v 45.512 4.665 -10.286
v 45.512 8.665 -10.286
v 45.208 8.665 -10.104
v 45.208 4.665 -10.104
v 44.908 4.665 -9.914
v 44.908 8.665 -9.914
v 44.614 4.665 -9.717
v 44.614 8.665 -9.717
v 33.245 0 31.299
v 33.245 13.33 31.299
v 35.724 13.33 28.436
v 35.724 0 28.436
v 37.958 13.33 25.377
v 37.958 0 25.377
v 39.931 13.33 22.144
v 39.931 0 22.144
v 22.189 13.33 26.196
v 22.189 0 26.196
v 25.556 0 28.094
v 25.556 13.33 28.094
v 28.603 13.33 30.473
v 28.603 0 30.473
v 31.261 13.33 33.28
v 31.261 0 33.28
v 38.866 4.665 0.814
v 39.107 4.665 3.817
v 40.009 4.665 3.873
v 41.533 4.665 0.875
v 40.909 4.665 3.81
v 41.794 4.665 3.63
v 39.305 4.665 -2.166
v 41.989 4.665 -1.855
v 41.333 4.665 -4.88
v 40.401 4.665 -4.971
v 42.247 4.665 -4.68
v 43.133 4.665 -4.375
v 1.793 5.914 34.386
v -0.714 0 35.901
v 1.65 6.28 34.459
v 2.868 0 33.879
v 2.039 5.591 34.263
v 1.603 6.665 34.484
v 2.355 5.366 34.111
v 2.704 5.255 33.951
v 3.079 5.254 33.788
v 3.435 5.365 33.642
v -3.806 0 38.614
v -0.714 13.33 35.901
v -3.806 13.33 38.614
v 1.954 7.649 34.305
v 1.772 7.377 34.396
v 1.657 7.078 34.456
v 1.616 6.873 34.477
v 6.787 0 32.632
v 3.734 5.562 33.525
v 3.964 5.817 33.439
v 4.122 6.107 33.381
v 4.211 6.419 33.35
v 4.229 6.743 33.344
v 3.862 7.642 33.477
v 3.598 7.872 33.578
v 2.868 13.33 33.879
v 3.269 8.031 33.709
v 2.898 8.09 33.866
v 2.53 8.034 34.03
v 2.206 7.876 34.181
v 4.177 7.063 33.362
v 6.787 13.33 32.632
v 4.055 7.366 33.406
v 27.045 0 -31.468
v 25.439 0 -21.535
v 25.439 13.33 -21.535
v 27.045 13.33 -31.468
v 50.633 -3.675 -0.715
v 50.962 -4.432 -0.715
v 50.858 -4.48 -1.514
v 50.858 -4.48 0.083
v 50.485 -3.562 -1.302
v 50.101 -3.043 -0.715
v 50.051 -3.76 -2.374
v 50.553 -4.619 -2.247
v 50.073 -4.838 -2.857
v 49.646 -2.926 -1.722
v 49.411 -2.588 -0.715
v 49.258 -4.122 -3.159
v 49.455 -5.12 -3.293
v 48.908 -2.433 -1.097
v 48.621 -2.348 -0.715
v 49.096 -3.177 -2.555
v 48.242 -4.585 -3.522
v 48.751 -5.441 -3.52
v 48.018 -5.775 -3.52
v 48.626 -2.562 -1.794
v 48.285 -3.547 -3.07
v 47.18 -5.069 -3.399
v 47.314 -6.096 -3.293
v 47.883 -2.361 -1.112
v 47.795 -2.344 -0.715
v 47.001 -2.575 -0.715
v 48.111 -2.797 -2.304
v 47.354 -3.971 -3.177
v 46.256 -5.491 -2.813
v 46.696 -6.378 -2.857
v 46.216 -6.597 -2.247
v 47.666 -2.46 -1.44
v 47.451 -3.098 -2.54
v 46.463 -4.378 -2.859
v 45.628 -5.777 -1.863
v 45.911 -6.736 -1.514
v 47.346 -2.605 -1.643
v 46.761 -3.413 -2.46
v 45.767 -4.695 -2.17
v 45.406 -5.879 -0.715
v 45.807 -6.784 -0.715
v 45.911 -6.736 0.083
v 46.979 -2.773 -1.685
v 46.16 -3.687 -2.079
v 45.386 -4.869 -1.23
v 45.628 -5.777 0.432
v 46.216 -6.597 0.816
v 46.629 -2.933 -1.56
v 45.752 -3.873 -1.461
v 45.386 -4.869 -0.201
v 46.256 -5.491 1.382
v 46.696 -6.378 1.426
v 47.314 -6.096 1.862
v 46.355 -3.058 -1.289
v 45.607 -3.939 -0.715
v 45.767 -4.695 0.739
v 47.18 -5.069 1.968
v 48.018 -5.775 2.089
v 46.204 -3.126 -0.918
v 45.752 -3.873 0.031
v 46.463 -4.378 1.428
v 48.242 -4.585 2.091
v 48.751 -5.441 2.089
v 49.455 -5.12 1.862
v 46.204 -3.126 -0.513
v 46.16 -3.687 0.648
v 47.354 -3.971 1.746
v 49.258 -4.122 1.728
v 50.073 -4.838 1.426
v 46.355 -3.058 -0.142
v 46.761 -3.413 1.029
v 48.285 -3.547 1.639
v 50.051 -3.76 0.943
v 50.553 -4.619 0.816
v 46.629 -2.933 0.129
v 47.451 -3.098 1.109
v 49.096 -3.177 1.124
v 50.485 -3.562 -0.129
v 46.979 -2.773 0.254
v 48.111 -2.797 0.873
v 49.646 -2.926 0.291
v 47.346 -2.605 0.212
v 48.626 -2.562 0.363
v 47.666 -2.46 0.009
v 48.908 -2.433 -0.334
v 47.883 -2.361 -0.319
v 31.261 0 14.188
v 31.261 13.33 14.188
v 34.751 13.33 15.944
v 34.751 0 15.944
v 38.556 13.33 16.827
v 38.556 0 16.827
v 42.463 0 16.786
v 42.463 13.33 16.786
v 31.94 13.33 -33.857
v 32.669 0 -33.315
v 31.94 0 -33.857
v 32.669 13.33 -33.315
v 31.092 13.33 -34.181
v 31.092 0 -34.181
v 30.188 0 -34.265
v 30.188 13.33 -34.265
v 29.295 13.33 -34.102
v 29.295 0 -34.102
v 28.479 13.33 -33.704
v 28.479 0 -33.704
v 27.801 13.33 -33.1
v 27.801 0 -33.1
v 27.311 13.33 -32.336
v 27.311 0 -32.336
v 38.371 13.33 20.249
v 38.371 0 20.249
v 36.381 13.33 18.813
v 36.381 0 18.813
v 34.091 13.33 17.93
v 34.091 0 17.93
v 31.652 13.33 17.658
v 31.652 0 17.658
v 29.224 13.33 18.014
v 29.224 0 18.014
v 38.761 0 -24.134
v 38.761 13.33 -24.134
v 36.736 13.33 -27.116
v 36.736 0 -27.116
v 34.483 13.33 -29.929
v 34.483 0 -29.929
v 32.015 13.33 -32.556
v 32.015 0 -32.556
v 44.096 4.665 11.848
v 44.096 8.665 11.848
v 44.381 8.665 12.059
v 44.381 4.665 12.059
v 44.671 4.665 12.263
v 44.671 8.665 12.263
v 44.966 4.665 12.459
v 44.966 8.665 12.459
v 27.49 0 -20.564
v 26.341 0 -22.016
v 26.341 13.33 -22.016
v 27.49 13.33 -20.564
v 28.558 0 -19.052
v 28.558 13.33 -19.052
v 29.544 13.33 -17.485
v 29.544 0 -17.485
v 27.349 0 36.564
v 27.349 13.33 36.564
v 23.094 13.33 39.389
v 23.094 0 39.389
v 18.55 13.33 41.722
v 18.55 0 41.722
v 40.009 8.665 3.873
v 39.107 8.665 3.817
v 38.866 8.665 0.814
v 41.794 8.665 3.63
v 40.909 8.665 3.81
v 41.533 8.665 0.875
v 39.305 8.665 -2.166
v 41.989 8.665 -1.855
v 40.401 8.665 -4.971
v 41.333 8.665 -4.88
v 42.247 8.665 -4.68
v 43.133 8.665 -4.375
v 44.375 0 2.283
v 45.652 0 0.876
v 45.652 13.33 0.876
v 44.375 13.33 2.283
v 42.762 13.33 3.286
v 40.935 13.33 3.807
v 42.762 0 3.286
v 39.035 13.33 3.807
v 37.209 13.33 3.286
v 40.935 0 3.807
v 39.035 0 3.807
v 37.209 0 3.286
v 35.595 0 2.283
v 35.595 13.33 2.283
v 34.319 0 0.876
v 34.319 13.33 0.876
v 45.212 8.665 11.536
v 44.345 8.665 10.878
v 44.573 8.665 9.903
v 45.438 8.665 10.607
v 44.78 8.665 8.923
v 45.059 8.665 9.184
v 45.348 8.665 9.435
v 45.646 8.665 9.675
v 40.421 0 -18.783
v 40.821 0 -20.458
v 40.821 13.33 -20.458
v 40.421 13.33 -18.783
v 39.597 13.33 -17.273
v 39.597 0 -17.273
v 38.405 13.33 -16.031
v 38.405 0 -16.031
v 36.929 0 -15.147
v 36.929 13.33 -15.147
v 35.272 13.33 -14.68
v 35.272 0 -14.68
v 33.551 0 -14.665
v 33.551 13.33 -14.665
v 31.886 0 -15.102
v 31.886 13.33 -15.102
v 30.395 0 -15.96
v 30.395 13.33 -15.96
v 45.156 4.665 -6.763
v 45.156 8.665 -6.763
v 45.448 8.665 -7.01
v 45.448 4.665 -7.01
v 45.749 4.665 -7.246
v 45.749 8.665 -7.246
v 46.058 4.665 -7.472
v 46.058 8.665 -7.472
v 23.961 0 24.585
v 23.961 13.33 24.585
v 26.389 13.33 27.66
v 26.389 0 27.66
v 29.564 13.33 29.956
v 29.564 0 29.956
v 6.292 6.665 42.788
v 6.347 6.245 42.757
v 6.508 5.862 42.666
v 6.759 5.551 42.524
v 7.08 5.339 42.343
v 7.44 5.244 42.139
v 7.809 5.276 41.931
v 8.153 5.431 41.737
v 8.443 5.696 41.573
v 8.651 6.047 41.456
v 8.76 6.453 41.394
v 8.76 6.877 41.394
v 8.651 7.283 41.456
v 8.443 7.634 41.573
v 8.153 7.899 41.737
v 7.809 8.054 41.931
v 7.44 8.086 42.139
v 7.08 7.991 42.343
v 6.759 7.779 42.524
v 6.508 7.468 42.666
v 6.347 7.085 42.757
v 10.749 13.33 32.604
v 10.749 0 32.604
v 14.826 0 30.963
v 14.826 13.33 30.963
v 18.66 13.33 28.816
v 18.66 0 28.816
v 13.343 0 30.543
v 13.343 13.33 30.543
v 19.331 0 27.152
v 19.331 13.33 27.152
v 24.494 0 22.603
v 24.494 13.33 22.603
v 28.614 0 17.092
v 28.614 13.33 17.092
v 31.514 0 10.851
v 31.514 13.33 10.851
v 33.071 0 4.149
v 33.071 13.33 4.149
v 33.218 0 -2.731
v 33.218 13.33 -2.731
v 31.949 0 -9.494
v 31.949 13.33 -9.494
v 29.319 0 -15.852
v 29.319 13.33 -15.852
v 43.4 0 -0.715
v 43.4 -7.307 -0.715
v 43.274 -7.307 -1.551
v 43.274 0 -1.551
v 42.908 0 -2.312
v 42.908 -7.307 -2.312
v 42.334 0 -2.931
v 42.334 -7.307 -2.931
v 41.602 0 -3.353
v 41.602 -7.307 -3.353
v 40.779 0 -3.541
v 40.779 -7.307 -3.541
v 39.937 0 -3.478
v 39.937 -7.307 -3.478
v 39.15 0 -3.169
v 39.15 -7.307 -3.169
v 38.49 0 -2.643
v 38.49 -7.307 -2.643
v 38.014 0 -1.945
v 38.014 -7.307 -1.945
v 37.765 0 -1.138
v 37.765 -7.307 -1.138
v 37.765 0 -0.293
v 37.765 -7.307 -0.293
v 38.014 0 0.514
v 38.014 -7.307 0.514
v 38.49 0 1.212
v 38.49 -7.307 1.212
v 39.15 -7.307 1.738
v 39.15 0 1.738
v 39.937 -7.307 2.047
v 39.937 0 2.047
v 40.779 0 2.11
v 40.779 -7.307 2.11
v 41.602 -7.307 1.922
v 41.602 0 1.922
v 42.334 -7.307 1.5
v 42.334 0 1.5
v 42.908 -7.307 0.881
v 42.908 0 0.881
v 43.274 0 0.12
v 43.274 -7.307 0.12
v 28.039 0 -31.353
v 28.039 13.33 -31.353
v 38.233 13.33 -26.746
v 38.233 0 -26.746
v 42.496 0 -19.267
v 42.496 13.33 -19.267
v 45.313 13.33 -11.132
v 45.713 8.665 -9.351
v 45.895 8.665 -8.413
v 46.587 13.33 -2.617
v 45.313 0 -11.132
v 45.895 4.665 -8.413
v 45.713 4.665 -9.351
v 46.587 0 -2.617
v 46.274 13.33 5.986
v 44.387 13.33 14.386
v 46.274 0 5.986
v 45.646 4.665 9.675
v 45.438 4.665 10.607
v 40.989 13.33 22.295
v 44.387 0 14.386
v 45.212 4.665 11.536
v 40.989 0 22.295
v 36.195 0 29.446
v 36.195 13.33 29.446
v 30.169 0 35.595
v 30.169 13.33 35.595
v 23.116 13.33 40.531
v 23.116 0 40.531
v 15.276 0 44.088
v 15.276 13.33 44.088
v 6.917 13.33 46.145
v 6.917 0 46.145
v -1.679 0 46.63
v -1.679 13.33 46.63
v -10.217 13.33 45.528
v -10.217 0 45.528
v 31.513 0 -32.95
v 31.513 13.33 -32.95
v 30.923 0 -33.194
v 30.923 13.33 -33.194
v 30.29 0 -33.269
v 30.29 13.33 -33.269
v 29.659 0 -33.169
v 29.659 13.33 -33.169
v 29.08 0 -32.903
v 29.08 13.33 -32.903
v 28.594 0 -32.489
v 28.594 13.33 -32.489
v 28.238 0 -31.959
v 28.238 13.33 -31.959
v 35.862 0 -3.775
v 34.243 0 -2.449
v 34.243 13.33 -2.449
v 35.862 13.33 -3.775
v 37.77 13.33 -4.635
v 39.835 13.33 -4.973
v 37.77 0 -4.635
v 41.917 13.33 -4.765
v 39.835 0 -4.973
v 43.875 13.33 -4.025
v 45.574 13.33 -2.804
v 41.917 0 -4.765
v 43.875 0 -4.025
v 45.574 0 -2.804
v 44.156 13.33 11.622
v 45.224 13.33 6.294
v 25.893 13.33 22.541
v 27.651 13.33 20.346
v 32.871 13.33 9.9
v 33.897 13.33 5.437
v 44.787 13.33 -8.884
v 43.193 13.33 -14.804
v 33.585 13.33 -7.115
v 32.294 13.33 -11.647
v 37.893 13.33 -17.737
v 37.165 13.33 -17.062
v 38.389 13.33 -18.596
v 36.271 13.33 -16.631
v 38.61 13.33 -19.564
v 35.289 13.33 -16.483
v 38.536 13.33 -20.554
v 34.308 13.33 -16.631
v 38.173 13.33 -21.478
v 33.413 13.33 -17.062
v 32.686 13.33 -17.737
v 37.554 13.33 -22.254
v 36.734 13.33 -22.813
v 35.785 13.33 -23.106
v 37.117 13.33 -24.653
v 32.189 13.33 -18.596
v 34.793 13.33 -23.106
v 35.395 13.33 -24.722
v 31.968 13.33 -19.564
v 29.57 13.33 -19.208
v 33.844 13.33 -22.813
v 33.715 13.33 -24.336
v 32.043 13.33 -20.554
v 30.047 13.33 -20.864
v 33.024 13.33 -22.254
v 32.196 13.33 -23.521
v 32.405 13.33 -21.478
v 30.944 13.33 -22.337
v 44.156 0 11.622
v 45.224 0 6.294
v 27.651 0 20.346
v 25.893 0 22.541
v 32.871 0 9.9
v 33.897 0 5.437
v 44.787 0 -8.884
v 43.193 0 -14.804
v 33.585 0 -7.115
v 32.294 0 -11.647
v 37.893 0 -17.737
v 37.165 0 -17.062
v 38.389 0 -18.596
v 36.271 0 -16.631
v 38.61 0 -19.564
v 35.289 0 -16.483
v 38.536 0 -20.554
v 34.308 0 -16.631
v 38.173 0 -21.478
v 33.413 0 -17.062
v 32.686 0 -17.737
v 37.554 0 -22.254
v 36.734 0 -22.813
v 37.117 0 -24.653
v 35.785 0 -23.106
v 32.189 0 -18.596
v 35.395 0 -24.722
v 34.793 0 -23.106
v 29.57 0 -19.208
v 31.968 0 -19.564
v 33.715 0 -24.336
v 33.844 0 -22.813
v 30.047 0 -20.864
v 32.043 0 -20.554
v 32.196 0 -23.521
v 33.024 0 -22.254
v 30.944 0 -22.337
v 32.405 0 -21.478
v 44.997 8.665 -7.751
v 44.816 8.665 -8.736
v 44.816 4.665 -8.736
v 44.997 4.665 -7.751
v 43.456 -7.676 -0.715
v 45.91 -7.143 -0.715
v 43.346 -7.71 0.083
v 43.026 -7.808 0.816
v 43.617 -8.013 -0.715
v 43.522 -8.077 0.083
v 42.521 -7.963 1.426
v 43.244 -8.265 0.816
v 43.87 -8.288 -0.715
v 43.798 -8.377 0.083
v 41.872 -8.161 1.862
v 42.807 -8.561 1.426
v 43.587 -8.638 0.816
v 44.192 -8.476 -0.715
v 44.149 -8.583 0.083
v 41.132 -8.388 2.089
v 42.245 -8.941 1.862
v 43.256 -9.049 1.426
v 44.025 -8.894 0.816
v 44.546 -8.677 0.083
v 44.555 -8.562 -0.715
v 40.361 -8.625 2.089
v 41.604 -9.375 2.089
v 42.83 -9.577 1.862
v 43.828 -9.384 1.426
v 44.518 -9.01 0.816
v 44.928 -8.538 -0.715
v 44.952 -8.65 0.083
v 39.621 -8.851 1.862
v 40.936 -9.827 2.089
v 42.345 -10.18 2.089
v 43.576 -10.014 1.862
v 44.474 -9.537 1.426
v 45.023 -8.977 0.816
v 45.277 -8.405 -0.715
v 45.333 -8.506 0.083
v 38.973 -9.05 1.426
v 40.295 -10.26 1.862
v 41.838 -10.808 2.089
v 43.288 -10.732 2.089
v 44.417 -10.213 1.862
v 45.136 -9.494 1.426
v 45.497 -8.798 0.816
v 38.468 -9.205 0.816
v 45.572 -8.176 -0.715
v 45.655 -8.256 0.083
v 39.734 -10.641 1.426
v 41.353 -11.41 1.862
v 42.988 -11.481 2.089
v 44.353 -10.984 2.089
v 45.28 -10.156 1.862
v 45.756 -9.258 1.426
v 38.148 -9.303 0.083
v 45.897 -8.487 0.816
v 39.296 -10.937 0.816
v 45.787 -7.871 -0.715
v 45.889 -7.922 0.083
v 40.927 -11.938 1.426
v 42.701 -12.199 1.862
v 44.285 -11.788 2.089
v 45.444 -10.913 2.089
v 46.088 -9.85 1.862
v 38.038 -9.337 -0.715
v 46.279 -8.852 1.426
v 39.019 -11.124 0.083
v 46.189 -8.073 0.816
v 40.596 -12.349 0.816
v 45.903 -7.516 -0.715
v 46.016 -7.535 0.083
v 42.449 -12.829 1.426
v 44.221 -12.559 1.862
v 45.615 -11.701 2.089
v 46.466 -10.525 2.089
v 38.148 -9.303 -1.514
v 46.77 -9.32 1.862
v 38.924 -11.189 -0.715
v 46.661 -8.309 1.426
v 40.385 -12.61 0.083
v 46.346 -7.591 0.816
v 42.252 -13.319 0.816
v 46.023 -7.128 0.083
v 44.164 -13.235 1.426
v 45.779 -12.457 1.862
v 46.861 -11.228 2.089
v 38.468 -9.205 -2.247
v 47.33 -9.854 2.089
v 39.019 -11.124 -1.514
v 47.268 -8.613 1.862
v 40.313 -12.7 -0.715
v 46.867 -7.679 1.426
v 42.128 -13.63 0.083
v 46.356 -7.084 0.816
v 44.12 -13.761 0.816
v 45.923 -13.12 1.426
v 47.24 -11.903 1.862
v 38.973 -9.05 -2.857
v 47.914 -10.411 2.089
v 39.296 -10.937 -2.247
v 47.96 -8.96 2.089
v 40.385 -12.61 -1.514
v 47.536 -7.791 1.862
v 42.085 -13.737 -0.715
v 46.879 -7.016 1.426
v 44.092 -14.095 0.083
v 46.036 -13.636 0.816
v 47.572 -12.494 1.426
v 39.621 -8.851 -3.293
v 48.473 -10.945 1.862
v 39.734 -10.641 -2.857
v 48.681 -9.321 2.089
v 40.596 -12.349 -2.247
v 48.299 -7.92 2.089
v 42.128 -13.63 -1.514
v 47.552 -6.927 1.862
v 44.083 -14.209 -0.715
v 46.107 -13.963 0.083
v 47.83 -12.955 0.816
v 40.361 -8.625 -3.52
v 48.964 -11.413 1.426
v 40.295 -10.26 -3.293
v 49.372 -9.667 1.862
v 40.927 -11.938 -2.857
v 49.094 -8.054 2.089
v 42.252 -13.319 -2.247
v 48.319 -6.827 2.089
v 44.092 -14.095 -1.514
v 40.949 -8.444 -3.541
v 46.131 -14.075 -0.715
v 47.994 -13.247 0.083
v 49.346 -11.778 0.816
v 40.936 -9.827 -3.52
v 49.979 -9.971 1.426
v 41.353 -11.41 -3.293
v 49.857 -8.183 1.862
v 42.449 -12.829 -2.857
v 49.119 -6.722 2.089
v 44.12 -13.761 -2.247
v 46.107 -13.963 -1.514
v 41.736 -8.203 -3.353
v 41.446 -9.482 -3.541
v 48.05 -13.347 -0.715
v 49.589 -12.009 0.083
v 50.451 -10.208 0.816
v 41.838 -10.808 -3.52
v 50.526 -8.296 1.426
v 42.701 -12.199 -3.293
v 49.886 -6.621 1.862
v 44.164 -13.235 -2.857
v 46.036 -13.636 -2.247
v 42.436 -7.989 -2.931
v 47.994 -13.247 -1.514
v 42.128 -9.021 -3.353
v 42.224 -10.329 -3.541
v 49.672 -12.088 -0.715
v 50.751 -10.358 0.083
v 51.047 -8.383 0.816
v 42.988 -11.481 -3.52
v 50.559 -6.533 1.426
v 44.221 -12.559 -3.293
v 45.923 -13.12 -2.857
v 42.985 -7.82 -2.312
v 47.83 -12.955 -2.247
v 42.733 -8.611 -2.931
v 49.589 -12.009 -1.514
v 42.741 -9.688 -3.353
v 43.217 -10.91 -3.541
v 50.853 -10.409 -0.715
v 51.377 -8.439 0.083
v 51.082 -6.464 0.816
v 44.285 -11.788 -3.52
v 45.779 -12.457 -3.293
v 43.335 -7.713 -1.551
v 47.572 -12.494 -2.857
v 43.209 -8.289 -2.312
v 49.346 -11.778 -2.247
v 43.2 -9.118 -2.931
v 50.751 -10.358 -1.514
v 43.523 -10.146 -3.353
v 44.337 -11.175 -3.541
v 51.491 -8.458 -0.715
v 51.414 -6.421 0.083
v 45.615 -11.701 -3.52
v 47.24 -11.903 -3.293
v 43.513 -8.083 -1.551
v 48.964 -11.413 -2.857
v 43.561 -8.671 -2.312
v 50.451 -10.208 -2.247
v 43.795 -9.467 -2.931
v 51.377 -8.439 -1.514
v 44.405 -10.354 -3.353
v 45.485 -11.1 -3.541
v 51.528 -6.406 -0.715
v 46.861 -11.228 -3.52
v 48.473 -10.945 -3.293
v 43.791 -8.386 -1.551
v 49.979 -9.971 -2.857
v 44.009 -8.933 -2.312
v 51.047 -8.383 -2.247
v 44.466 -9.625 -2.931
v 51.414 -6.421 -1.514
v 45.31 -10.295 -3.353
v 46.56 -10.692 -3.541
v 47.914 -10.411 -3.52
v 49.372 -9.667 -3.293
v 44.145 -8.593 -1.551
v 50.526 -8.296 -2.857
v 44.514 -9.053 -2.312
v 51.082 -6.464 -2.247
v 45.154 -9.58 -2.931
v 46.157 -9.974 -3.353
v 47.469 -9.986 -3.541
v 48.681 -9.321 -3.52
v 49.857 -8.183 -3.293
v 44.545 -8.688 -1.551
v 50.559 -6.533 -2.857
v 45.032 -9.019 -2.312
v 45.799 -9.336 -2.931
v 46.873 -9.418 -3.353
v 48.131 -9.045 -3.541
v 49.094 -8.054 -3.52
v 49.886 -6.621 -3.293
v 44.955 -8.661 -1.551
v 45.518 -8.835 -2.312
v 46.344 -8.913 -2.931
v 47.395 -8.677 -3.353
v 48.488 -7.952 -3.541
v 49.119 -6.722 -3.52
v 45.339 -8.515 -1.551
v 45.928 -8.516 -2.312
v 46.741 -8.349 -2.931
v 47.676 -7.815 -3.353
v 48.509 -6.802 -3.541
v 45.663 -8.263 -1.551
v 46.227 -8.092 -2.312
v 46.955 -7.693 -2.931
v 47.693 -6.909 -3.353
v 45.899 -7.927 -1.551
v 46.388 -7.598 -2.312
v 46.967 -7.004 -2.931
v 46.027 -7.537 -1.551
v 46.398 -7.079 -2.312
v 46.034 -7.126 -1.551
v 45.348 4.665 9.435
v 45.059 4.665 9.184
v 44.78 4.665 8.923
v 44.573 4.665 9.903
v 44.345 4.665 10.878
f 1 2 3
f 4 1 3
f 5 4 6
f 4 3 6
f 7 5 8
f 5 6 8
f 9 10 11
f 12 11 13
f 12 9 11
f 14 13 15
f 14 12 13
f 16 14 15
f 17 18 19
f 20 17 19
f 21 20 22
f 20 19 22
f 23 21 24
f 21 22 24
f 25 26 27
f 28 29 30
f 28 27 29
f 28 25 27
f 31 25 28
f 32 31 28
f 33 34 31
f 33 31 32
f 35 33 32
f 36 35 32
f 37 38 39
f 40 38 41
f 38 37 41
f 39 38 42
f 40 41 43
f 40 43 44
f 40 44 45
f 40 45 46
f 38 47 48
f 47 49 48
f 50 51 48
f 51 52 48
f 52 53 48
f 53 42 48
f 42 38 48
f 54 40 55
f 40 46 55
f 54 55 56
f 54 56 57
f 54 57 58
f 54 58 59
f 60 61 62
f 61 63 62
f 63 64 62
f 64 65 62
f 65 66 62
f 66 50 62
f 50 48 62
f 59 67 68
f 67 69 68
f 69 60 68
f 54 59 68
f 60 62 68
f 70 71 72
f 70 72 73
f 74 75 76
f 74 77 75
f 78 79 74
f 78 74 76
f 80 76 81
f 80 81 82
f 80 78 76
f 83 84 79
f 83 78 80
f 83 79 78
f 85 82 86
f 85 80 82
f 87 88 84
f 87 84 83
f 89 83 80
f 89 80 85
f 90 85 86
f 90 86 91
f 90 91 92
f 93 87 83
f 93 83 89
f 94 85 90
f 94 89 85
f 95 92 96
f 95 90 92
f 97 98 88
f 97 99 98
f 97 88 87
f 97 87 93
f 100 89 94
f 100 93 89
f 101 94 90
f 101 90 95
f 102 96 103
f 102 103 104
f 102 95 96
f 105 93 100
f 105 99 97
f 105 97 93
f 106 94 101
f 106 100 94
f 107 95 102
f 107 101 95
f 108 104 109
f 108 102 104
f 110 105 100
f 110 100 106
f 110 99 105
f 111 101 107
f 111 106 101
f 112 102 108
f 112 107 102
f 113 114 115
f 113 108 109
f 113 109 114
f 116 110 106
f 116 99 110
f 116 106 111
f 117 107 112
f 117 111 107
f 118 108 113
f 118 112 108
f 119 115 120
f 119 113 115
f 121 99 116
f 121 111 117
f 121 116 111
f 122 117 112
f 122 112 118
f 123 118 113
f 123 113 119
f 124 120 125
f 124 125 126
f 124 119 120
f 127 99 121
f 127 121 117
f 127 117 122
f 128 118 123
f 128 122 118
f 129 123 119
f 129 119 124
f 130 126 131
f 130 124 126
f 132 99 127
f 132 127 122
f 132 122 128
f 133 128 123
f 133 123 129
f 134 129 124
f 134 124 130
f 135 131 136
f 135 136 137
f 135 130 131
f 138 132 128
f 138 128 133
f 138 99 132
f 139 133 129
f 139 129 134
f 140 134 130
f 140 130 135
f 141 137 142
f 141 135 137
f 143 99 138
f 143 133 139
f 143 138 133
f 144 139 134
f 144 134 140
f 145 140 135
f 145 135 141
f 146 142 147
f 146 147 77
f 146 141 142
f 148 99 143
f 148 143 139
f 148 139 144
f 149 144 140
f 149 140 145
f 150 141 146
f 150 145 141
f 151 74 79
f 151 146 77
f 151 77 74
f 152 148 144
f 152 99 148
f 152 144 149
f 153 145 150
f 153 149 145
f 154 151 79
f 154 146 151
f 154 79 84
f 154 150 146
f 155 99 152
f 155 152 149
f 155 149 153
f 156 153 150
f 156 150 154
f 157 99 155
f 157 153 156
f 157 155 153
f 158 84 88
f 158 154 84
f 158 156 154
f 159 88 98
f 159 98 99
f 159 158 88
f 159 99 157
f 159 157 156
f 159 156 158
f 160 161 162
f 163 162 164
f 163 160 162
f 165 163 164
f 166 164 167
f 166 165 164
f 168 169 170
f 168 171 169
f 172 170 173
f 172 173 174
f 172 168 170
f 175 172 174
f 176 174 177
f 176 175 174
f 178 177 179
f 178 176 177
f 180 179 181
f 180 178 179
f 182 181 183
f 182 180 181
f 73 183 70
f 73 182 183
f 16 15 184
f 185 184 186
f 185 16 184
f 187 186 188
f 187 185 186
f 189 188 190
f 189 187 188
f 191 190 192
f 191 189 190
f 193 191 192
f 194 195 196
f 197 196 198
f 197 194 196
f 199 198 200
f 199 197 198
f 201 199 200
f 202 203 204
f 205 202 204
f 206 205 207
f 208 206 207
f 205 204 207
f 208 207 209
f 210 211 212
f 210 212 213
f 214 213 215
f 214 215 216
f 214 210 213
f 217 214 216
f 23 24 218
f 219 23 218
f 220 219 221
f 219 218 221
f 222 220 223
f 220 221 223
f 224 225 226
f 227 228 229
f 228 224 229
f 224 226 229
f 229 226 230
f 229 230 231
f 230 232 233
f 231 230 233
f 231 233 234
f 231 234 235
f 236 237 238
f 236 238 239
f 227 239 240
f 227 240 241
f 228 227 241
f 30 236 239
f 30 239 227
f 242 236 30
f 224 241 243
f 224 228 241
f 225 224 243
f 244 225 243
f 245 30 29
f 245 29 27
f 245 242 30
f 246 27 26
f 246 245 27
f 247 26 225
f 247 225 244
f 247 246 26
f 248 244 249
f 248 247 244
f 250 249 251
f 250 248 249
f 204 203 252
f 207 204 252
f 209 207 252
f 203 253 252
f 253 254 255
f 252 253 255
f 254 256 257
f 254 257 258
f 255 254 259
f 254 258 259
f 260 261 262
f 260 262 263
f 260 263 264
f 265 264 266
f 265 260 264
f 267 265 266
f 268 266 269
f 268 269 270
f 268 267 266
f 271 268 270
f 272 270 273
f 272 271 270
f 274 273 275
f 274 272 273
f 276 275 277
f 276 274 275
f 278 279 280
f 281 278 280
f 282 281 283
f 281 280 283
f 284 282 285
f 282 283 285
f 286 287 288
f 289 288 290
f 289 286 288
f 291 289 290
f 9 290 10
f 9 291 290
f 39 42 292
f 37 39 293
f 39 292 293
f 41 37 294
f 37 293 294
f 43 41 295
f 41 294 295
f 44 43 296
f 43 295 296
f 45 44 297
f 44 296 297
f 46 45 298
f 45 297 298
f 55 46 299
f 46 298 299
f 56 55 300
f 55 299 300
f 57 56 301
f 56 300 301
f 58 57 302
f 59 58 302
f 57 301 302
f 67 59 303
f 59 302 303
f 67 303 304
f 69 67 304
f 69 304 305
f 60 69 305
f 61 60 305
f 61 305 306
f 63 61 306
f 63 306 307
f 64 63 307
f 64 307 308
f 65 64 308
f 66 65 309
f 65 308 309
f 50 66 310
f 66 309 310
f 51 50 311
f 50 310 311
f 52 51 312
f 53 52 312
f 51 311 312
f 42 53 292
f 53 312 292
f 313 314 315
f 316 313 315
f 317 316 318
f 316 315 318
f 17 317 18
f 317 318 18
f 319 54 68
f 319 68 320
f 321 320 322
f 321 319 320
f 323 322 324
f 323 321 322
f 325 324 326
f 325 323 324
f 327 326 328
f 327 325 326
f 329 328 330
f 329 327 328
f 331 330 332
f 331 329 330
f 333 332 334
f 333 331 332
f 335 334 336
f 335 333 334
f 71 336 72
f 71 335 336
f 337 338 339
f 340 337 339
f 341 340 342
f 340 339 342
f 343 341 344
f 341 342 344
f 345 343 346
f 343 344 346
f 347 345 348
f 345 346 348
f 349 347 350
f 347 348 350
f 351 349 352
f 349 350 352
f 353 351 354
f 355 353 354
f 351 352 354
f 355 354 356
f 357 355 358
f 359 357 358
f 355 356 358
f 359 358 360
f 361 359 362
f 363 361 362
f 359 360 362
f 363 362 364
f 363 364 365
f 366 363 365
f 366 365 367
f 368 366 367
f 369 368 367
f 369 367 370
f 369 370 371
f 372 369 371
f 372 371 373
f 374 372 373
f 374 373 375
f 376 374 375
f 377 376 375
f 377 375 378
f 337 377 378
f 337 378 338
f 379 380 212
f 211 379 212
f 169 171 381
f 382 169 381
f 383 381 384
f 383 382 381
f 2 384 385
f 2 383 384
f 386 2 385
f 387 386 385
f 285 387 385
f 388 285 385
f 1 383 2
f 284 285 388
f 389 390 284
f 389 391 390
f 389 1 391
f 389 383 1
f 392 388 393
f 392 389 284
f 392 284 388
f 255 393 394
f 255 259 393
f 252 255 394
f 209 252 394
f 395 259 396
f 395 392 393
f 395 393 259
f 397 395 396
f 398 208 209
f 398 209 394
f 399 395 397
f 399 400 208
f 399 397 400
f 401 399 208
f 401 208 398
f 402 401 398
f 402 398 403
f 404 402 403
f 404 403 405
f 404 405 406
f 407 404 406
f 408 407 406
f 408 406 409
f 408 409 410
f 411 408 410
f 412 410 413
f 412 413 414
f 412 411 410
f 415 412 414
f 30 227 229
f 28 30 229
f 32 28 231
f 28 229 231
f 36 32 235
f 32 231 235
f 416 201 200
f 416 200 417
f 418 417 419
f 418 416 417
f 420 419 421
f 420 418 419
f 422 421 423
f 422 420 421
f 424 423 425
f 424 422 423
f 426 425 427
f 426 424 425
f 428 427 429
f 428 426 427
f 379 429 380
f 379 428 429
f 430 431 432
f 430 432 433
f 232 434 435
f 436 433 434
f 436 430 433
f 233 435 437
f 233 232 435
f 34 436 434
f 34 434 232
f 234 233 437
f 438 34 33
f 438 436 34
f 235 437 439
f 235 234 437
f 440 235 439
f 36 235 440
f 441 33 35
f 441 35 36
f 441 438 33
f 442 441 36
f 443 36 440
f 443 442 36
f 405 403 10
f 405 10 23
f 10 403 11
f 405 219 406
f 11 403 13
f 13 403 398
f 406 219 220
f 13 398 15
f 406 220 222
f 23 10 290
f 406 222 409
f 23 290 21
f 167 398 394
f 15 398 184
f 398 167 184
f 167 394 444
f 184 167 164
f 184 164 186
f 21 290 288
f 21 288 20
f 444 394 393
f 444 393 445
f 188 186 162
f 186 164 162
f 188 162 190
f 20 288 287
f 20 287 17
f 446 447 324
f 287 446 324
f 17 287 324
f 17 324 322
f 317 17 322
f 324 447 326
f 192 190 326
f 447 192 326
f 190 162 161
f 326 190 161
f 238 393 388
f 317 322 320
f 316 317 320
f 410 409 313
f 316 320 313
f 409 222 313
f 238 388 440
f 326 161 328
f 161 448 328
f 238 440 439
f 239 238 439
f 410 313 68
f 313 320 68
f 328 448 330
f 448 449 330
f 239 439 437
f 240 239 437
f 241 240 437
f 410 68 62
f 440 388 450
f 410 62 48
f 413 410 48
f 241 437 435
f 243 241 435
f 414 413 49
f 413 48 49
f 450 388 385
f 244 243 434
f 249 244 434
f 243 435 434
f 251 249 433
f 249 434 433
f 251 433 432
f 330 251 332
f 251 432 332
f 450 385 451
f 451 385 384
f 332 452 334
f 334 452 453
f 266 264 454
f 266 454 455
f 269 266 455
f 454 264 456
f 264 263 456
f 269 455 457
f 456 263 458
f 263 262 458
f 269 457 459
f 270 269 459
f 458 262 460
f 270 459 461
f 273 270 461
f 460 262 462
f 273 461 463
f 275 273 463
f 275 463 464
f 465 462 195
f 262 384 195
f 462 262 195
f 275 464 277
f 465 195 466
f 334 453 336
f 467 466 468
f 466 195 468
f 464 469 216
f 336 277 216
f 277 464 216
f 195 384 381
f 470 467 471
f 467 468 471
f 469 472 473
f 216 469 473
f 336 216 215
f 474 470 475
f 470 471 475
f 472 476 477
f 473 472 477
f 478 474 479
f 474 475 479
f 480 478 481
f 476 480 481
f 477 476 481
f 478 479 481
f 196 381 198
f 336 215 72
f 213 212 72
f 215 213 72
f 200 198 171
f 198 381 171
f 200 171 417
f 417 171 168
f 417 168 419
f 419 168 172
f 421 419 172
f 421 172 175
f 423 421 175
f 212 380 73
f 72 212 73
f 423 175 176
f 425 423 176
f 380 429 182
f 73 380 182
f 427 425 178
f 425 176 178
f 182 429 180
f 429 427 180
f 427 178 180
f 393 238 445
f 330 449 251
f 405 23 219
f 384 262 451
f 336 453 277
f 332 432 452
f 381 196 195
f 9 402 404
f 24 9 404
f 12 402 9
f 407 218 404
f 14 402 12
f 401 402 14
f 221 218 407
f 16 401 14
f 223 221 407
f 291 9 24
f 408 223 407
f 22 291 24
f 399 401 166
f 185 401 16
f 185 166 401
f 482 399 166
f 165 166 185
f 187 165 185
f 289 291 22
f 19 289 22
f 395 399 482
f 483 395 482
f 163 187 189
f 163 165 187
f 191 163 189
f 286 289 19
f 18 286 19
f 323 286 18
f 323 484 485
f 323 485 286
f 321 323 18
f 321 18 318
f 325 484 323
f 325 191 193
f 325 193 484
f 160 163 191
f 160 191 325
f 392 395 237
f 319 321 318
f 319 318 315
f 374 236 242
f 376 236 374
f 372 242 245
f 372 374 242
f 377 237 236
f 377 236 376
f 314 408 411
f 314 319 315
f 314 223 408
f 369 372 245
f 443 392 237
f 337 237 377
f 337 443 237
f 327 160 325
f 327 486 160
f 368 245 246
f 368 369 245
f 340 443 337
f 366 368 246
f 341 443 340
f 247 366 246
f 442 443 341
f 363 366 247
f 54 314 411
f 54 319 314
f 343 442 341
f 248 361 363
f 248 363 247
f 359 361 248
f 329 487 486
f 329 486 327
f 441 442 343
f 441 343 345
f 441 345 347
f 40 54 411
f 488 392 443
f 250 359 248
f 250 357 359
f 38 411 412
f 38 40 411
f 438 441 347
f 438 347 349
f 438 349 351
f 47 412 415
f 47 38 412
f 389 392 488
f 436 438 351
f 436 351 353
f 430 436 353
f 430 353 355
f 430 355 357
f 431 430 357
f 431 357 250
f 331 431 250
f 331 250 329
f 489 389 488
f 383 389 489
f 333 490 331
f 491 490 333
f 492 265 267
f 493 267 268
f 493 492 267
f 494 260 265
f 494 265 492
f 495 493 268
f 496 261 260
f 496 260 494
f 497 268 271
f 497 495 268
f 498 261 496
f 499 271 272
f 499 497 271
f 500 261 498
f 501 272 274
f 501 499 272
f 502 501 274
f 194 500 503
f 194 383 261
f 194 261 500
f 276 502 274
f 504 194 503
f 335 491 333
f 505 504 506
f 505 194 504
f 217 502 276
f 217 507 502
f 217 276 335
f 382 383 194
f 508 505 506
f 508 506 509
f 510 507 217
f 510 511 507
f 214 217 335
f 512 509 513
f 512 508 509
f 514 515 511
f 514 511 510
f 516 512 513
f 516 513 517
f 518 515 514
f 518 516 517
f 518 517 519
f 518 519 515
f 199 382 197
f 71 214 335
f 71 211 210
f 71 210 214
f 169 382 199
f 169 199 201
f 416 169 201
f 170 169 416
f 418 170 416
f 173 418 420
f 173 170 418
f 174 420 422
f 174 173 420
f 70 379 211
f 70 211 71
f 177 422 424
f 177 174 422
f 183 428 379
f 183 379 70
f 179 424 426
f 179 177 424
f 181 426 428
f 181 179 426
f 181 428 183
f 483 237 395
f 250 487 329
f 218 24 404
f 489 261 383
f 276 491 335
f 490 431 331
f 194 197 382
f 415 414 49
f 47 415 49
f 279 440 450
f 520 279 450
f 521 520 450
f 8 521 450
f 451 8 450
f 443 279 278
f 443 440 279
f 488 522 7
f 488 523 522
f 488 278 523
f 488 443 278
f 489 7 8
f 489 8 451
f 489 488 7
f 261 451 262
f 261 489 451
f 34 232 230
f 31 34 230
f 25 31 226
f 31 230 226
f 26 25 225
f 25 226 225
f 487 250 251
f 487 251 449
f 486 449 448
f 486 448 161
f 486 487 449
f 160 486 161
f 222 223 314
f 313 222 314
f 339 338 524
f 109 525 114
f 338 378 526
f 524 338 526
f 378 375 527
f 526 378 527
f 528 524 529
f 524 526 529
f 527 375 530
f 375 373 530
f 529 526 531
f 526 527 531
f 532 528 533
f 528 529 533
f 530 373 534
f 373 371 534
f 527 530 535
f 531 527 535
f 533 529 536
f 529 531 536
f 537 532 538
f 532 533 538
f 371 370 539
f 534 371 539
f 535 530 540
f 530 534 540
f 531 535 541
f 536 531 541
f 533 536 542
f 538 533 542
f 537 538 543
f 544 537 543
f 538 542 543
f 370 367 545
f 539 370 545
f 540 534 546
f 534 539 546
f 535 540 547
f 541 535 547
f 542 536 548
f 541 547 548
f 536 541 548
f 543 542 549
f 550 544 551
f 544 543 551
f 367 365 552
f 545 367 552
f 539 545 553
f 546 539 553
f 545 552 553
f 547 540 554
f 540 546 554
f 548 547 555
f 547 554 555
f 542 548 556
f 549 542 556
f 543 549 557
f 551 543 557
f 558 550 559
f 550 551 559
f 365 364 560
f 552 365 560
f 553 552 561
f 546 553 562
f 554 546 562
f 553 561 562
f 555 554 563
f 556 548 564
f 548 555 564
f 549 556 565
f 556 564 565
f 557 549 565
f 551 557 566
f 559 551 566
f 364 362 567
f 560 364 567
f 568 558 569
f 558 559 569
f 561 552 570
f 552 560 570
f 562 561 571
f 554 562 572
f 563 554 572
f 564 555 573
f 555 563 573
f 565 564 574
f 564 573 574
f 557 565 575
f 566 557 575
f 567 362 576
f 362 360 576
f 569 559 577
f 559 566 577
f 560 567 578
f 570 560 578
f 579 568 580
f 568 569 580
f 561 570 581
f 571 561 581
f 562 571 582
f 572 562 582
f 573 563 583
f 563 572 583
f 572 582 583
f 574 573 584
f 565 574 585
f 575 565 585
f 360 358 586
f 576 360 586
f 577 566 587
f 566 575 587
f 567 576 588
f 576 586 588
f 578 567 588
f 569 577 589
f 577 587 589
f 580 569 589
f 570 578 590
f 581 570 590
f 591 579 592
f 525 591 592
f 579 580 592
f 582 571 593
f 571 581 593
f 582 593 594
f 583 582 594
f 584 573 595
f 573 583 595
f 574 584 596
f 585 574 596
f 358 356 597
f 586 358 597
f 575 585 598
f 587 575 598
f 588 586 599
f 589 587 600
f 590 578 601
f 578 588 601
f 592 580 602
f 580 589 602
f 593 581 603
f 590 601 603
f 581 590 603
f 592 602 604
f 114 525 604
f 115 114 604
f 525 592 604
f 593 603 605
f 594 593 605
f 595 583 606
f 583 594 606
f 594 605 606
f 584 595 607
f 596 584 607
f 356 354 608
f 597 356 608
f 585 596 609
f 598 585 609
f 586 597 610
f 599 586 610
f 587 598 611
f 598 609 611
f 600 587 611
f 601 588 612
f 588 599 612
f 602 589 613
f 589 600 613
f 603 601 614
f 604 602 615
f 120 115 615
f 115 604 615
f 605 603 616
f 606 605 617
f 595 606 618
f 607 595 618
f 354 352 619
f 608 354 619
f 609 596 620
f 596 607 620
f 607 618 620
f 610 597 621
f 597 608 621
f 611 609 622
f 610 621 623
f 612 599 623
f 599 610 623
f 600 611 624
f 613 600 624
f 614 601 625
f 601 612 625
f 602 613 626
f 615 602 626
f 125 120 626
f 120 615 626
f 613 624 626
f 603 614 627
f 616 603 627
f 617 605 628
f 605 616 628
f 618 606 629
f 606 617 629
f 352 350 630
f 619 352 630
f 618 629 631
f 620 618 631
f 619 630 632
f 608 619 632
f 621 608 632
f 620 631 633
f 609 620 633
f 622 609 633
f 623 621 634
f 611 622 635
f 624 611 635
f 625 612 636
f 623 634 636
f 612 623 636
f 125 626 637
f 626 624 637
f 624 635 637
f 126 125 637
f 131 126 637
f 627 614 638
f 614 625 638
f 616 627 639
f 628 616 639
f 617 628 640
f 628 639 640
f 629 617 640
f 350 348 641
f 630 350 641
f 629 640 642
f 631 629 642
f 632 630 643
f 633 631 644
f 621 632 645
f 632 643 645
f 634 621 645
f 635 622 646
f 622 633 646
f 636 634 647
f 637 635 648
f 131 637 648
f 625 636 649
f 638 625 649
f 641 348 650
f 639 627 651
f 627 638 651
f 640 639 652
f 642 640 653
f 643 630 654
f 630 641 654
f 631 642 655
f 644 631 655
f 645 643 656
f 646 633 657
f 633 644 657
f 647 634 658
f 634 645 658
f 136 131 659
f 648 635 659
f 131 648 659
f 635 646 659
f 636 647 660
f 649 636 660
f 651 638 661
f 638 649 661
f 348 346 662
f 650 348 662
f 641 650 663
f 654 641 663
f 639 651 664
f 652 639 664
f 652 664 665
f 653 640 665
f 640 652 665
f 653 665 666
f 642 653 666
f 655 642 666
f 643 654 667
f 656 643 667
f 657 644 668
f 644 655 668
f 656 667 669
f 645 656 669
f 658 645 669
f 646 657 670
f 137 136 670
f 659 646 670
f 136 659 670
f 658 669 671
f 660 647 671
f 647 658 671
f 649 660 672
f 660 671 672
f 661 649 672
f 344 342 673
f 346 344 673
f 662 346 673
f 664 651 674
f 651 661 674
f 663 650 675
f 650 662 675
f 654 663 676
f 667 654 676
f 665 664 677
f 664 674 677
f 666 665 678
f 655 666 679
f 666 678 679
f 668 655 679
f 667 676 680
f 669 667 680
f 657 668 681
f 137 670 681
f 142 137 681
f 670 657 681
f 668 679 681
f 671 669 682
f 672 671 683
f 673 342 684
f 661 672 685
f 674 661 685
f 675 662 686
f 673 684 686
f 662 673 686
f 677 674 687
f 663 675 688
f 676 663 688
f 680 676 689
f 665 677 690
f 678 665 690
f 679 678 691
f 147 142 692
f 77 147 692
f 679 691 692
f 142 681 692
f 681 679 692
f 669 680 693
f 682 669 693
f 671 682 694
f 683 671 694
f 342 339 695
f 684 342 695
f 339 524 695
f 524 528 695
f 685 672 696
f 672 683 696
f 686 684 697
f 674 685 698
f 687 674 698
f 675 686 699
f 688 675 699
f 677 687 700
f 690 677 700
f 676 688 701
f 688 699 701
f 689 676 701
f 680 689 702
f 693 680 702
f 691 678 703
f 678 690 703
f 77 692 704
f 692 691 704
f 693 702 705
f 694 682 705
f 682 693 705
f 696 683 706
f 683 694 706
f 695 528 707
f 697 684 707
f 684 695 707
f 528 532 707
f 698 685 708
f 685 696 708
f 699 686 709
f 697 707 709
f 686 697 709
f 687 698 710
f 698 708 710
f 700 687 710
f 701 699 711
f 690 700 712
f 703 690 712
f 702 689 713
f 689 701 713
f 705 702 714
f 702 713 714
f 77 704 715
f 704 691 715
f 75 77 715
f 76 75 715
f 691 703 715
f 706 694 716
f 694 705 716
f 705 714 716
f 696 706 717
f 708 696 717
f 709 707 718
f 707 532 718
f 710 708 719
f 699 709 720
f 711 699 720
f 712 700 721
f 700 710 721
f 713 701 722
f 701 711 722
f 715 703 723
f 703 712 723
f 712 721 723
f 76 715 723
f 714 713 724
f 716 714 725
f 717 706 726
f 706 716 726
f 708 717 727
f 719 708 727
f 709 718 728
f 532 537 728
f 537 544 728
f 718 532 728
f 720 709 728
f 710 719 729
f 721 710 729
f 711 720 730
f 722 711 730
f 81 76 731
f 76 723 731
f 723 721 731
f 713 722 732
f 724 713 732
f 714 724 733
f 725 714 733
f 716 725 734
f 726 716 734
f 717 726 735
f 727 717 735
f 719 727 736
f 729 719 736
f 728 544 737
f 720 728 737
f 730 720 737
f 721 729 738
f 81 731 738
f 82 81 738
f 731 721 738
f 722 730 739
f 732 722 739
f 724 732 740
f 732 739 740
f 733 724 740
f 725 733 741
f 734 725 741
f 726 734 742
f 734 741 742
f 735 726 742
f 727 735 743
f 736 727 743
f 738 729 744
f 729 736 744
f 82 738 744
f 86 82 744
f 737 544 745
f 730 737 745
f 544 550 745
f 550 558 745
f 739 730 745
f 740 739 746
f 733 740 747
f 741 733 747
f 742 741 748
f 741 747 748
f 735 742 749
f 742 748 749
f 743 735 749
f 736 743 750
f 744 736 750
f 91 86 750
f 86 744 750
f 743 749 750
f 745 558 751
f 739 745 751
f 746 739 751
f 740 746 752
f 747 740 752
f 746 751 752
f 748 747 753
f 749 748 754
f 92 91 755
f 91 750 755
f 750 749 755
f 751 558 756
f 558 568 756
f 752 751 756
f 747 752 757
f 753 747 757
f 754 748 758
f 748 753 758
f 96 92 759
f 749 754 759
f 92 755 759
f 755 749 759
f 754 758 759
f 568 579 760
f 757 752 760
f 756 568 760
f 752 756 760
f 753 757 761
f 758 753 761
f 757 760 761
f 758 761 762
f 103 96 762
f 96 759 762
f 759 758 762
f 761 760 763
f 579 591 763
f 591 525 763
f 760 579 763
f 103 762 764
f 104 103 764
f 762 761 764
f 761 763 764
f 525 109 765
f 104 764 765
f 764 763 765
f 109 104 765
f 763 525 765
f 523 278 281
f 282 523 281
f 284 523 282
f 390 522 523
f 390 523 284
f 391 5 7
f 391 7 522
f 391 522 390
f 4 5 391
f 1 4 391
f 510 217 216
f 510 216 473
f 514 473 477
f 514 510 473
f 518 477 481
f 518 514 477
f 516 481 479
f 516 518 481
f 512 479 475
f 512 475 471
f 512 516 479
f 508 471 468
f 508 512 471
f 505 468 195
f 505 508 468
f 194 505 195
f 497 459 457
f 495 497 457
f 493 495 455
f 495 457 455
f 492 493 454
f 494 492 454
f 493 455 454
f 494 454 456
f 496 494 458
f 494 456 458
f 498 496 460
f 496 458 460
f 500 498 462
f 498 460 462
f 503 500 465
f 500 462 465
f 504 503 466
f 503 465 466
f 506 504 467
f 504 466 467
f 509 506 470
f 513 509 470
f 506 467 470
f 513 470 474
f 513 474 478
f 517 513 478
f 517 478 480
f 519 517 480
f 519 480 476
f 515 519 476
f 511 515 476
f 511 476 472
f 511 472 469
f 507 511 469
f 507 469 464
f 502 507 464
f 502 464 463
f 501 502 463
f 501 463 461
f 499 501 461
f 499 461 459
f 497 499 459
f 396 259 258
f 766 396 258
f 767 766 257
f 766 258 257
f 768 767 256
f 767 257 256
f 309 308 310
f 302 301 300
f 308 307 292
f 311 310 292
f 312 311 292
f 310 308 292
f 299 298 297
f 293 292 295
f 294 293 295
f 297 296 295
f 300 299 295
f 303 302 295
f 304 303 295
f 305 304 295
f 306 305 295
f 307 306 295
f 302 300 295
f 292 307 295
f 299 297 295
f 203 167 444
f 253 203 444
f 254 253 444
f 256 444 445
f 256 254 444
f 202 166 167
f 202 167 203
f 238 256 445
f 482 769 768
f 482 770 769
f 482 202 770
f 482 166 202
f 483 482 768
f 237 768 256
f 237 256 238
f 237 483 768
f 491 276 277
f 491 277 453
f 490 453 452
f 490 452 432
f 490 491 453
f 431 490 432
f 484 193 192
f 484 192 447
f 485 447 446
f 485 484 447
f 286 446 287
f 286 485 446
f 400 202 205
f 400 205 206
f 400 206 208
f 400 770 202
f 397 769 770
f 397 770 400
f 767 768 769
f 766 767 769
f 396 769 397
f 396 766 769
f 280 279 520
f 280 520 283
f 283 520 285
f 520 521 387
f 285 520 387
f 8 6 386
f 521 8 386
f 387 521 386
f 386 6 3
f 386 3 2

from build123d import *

# Parameters (mm, degrees)
BOSS_EXTRUDE1_DEPTH        = 13.33
FILLET1_R                  = 20
SKETCH3_R                  = 3.33
CUT_EXTRUDE2_DEPTH         = 68.320131462
FILLET2_R                  = 3.333
SKETCH4_R                  = 2.8333333
DOME1_FACE_RADIUS          = 2.8333333
DOME1_HEIGHT               = 3.3333333
CUT_EXTRUDE3_DEPTH         = 2
MIRROR3_COPY_1_FACE_RADIUS = 2.8333333
MIRROR3_COPY_1_HEIGHT      = 3.3333333
SKETCH16_W                 = 36.728720905
SKETCH16_H                 = 19.011400322
CUT_EXTRUDE4_DEPTH         = 30
CUT_EXTRUDE5_DEPTH         = 71.999747127
SKETCH19_R                 = 1.425
CUT_EXTRUDE6_DEPTH         = 8.6


with BuildPart() as part:
    # Sketch1 → Boss-Extrude1 (new body)
    with BuildSketch(Plane(origin=(0, 0, 0), x_dir=(1, 0, 0), z_dir=(0, 1, 0))):
        with BuildLine():
            Line((25.438564969, 21.535280641), (27.993333135, 37.33))
            ThreePointArc((27.993333135, 37.33), (42.371570445, -19.53984693), (-10.216878485, -45.527694802))
            Line((-10.216878485, -45.527694802), (1.110949751, -33.311479863))
            ThreePointArc((1.110949751, -33.311479863), (30.46737546, -13.513990254), (25.438564969, 21.535280641))
        make_face()
    extrude(amount=BOSS_EXTRUDE1_DEPTH)

    # Fillet1
    fillet1_edges = [part.edges().sort_by_distance(p)[0] for p in [
        (1.110949751, 6.665, 33.311479863),
    ]]
    fillet(fillet1_edges, radius=FILLET1_R)

    # Sketch3 → Cut-Extrude2 (cut, through all)
    with BuildSketch(Plane(origin=(0, 13.33, 0), x_dir=(1, 0, 0), z_dir=(0, 1, 0))):
        with Locations(Location((35.289122258, 19.812921474, 0), (0, 0, 270))):
            Circle(SKETCH3_R)
    extrude(amount=-CUT_EXTRUDE2_DEPTH, mode=Mode.SUBTRACT)

    # Fillet2
    fillet2_edges = [part.edges().sort_by_distance(p)[0] for p in [
        (27.993333135, 6.665, -37.33),
    ]]
    fillet(fillet2_edges, radius=FILLET2_R)

    # Sweep1: sweep along a path in Sketch6
    with BuildLine(Plane.XY) as sweep1_path:
        Line((40.567020893, 13.33), (40.567020893, 20.636666))
        ThreePointArc((40.567020893, 20.636666), (45.529478945, 24.636666), (48.384610469, 18.938050913))
    # Sketch4 → Sweep1 (sweep)
    with BuildSketch(Plane(origin=(0, 13.33, 0), x_dir=(1, 0, 0), z_dir=(0, 1, 0))):
        with Locations((40.567020893, 0.715488074)):
            Circle(SKETCH4_R)
    sweep1 = sweep(path=sweep1_path.line)

    # Dome1: a dome of height H over a round flat face of radius A is a cap of a sphere of radius (A * A + H * H) / (2 * H)
    dome1_r = (DOME1_FACE_RADIUS * DOME1_FACE_RADIUS + DOME1_HEIGHT * DOME1_HEIGHT) / (2 * DOME1_HEIGHT)
    dome1_base = Plane((48.384610469, 18.938050913, -0.715488074), z_dir=(-0.414971112372, -0.909834587107, 0))
    with Locations(dome1_base.offset(DOME1_HEIGHT - dome1_r)):
        dome1_ball = Sphere(dome1_r, mode=Mode.PRIVATE)
    add(split(dome1_ball, bisect_by=dome1_base, keep=Keep.TOP, mode=Mode.PRIVATE))

    # Sketch7 → Cut-Extrude3 (cut, symmetric)
    with BuildSketch(Plane(origin=(0, 6.665, 0), x_dir=(1, 0, 0), z_dir=(0, 1, 0))):
        with BuildLine():
            ThreePointArc((44.965852541, -12.459041105), (45.327303444, -11.072089345), (45.645985213, -9.674690379))
            ThreePointArc((45.645985213, -9.674690379), (41.52914689, -0.997602982), (46.057874066, 7.47180276))
            ThreePointArc((46.057874066, 7.47180276), (45.806657105, 8.882891694), (45.51221871, 10.285599066))
            ThreePointArc((45.51221871, 10.285599066), (38.862616133, -0.933548234), (44.965852541, -12.459041105))
        make_face()
    extrude(amount=CUT_EXTRUDE3_DEPTH, both=True, mode=Mode.SUBTRACT)

    # Mirror3: Sweep1 across plane
    add(sweep1.mirror(Plane.ZX.offset(6.665)))

    # Mirror3 copy 1: a dome of height H over a round flat face of radius A is a cap of a sphere of radius (A * A + H * H) / (2 * H)
    mirror3_copy_1_r = (MIRROR3_COPY_1_FACE_RADIUS * MIRROR3_COPY_1_FACE_RADIUS + MIRROR3_COPY_1_HEIGHT * MIRROR3_COPY_1_HEIGHT) / (2 * MIRROR3_COPY_1_HEIGHT)
    mirror3_copy_1_base = Plane((48.384610469, -5.608050913, -0.715488074), z_dir=(-0.414971112372, 0.909834587107, 0))
    with Locations(mirror3_copy_1_base.offset(MIRROR3_COPY_1_HEIGHT - mirror3_copy_1_r)):
        mirror3_copy_1_ball = Sphere(mirror3_copy_1_r, mode=Mode.PRIVATE)
    add(split(mirror3_copy_1_ball, bisect_by=mirror3_copy_1_base, keep=Keep.TOP, mode=Mode.PRIVATE))

    # Sketch16 → Cut-Extrude4 (cut)
    with BuildSketch(Plane(origin=(0, 13.33, 0), x_dir=(1, 0, 0), z_dir=(0, 1, 0))):
        with Locations((41.954103887, 0)):
            Rectangle(SKETCH16_W, SKETCH16_H)
    extrude(amount=CUT_EXTRUDE4_DEPTH, mode=Mode.SUBTRACT)

    # Sketch18 → Cut-Extrude5 (cut, through all)
    with BuildSketch(Plane.XZ):
        with BuildLine():
            Line((28.039143401, -31.35294351), (26.341104847, -22.015791956))
            ThreePointArc((26.341104847, -22.015791956), (28.034108775, -19.815086303), (29.543730196, -17.484762112))
            ThreePointArc((29.543730196, -17.484762112), (32.195597251, -23.521489799), (38.760601016, -24.1340301))
            ThreePointArc((38.760601016, -24.1340301), (35.637384762, -28.544919116), (32.014856699, -32.555868143))
            ThreePointArc((32.014856699, -32.555868143), (29.659442281, -33.169198731), (28.039143401, -31.35294351))
        make_face()
        with BuildLine():
            Line((18.550254331, 41.721980589), (10.749078367, 32.603776074))
            ThreePointArc((10.749078367, 32.603776074), (16.777611199, 29.950970977), (22.188585816, 26.195716434))
            ThreePointArc((22.188585816, 26.195716434), (27.124492616, 29.226219474), (31.260994101, 33.280412374))
            ThreePointArc((31.260994101, 33.280412374), (25.260742984, 38.035910189), (18.550254331, 41.721980589))
        make_face()
        with BuildLine():
            ThreePointArc((40.820629514, -20.457561098), (36.928571374, -15.146521153), (30.394540812, -15.959974588))
            ThreePointArc((30.394540812, -15.959974588), (33.016991898, -9.403570916), (34.242514373, -2.449307946))
            ThreePointArc((34.242514373, -2.449307946), (39.834796056, -4.973265496), (45.573843855, -2.803632696))
            ThreePointArc((45.573843855, -2.803632696), (44.089869065, -11.870932812), (40.820629514, -20.457561098))
        make_face()
        with BuildLine():
            ThreePointArc((45.651589838, 0.876324867), (39.98520163, 3.873028579), (34.318813422, 0.876324867))
            ThreePointArc((34.318813422, 0.876324867), (33.458600037, 7.685764997), (31.260994101, 14.187993085))
            ThreePointArc((31.260994101, 14.187993085), (36.627069292, 16.498940097), (42.462553984, 16.785919968))
            ThreePointArc((42.462553984, 16.785919968), (44.769458221, 8.973918351), (45.651589838, 0.876324867))
        make_face()
        with BuildLine():
            ThreePointArc((39.931059829, 22.143758962), (35.264351947, 18.298272838), (29.224062449, 18.013968857))
            ThreePointArc((29.224062449, 18.013968857), (26.794540492, 21.461628545), (23.960583625, 24.58534792))
            ThreePointArc((23.960583625, 24.58534792), (27.897400776, 28.917406773), (33.24466644, 31.299005627))
            ThreePointArc((33.24466644, 31.299005627), (36.873111669, 26.929709168), (39.931059829, 22.143758962))
        make_face()
    extrude(amount=-CUT_EXTRUDE5_DEPTH, mode=Mode.SUBTRACT)

    # Sketch19 → Cut-Extrude6 (cut, symmetric)
    with BuildSketch(Plane(origin=(15.613362891, 0, 27.64706404), x_dir=(0.8707413871359999, 0, -0.491741229437267), z_dir=(0.491741229437267, 0, 0.8707413871359999))):
        with Locations(Location((-14.136648815, 6.665, 0), (0, 0, 180))):
            Circle(SKETCH19_R)
    extrude(amount=CUT_EXTRUDE6_DEPTH, both=True, mode=Mode.SUBTRACT)


solid = part.part
